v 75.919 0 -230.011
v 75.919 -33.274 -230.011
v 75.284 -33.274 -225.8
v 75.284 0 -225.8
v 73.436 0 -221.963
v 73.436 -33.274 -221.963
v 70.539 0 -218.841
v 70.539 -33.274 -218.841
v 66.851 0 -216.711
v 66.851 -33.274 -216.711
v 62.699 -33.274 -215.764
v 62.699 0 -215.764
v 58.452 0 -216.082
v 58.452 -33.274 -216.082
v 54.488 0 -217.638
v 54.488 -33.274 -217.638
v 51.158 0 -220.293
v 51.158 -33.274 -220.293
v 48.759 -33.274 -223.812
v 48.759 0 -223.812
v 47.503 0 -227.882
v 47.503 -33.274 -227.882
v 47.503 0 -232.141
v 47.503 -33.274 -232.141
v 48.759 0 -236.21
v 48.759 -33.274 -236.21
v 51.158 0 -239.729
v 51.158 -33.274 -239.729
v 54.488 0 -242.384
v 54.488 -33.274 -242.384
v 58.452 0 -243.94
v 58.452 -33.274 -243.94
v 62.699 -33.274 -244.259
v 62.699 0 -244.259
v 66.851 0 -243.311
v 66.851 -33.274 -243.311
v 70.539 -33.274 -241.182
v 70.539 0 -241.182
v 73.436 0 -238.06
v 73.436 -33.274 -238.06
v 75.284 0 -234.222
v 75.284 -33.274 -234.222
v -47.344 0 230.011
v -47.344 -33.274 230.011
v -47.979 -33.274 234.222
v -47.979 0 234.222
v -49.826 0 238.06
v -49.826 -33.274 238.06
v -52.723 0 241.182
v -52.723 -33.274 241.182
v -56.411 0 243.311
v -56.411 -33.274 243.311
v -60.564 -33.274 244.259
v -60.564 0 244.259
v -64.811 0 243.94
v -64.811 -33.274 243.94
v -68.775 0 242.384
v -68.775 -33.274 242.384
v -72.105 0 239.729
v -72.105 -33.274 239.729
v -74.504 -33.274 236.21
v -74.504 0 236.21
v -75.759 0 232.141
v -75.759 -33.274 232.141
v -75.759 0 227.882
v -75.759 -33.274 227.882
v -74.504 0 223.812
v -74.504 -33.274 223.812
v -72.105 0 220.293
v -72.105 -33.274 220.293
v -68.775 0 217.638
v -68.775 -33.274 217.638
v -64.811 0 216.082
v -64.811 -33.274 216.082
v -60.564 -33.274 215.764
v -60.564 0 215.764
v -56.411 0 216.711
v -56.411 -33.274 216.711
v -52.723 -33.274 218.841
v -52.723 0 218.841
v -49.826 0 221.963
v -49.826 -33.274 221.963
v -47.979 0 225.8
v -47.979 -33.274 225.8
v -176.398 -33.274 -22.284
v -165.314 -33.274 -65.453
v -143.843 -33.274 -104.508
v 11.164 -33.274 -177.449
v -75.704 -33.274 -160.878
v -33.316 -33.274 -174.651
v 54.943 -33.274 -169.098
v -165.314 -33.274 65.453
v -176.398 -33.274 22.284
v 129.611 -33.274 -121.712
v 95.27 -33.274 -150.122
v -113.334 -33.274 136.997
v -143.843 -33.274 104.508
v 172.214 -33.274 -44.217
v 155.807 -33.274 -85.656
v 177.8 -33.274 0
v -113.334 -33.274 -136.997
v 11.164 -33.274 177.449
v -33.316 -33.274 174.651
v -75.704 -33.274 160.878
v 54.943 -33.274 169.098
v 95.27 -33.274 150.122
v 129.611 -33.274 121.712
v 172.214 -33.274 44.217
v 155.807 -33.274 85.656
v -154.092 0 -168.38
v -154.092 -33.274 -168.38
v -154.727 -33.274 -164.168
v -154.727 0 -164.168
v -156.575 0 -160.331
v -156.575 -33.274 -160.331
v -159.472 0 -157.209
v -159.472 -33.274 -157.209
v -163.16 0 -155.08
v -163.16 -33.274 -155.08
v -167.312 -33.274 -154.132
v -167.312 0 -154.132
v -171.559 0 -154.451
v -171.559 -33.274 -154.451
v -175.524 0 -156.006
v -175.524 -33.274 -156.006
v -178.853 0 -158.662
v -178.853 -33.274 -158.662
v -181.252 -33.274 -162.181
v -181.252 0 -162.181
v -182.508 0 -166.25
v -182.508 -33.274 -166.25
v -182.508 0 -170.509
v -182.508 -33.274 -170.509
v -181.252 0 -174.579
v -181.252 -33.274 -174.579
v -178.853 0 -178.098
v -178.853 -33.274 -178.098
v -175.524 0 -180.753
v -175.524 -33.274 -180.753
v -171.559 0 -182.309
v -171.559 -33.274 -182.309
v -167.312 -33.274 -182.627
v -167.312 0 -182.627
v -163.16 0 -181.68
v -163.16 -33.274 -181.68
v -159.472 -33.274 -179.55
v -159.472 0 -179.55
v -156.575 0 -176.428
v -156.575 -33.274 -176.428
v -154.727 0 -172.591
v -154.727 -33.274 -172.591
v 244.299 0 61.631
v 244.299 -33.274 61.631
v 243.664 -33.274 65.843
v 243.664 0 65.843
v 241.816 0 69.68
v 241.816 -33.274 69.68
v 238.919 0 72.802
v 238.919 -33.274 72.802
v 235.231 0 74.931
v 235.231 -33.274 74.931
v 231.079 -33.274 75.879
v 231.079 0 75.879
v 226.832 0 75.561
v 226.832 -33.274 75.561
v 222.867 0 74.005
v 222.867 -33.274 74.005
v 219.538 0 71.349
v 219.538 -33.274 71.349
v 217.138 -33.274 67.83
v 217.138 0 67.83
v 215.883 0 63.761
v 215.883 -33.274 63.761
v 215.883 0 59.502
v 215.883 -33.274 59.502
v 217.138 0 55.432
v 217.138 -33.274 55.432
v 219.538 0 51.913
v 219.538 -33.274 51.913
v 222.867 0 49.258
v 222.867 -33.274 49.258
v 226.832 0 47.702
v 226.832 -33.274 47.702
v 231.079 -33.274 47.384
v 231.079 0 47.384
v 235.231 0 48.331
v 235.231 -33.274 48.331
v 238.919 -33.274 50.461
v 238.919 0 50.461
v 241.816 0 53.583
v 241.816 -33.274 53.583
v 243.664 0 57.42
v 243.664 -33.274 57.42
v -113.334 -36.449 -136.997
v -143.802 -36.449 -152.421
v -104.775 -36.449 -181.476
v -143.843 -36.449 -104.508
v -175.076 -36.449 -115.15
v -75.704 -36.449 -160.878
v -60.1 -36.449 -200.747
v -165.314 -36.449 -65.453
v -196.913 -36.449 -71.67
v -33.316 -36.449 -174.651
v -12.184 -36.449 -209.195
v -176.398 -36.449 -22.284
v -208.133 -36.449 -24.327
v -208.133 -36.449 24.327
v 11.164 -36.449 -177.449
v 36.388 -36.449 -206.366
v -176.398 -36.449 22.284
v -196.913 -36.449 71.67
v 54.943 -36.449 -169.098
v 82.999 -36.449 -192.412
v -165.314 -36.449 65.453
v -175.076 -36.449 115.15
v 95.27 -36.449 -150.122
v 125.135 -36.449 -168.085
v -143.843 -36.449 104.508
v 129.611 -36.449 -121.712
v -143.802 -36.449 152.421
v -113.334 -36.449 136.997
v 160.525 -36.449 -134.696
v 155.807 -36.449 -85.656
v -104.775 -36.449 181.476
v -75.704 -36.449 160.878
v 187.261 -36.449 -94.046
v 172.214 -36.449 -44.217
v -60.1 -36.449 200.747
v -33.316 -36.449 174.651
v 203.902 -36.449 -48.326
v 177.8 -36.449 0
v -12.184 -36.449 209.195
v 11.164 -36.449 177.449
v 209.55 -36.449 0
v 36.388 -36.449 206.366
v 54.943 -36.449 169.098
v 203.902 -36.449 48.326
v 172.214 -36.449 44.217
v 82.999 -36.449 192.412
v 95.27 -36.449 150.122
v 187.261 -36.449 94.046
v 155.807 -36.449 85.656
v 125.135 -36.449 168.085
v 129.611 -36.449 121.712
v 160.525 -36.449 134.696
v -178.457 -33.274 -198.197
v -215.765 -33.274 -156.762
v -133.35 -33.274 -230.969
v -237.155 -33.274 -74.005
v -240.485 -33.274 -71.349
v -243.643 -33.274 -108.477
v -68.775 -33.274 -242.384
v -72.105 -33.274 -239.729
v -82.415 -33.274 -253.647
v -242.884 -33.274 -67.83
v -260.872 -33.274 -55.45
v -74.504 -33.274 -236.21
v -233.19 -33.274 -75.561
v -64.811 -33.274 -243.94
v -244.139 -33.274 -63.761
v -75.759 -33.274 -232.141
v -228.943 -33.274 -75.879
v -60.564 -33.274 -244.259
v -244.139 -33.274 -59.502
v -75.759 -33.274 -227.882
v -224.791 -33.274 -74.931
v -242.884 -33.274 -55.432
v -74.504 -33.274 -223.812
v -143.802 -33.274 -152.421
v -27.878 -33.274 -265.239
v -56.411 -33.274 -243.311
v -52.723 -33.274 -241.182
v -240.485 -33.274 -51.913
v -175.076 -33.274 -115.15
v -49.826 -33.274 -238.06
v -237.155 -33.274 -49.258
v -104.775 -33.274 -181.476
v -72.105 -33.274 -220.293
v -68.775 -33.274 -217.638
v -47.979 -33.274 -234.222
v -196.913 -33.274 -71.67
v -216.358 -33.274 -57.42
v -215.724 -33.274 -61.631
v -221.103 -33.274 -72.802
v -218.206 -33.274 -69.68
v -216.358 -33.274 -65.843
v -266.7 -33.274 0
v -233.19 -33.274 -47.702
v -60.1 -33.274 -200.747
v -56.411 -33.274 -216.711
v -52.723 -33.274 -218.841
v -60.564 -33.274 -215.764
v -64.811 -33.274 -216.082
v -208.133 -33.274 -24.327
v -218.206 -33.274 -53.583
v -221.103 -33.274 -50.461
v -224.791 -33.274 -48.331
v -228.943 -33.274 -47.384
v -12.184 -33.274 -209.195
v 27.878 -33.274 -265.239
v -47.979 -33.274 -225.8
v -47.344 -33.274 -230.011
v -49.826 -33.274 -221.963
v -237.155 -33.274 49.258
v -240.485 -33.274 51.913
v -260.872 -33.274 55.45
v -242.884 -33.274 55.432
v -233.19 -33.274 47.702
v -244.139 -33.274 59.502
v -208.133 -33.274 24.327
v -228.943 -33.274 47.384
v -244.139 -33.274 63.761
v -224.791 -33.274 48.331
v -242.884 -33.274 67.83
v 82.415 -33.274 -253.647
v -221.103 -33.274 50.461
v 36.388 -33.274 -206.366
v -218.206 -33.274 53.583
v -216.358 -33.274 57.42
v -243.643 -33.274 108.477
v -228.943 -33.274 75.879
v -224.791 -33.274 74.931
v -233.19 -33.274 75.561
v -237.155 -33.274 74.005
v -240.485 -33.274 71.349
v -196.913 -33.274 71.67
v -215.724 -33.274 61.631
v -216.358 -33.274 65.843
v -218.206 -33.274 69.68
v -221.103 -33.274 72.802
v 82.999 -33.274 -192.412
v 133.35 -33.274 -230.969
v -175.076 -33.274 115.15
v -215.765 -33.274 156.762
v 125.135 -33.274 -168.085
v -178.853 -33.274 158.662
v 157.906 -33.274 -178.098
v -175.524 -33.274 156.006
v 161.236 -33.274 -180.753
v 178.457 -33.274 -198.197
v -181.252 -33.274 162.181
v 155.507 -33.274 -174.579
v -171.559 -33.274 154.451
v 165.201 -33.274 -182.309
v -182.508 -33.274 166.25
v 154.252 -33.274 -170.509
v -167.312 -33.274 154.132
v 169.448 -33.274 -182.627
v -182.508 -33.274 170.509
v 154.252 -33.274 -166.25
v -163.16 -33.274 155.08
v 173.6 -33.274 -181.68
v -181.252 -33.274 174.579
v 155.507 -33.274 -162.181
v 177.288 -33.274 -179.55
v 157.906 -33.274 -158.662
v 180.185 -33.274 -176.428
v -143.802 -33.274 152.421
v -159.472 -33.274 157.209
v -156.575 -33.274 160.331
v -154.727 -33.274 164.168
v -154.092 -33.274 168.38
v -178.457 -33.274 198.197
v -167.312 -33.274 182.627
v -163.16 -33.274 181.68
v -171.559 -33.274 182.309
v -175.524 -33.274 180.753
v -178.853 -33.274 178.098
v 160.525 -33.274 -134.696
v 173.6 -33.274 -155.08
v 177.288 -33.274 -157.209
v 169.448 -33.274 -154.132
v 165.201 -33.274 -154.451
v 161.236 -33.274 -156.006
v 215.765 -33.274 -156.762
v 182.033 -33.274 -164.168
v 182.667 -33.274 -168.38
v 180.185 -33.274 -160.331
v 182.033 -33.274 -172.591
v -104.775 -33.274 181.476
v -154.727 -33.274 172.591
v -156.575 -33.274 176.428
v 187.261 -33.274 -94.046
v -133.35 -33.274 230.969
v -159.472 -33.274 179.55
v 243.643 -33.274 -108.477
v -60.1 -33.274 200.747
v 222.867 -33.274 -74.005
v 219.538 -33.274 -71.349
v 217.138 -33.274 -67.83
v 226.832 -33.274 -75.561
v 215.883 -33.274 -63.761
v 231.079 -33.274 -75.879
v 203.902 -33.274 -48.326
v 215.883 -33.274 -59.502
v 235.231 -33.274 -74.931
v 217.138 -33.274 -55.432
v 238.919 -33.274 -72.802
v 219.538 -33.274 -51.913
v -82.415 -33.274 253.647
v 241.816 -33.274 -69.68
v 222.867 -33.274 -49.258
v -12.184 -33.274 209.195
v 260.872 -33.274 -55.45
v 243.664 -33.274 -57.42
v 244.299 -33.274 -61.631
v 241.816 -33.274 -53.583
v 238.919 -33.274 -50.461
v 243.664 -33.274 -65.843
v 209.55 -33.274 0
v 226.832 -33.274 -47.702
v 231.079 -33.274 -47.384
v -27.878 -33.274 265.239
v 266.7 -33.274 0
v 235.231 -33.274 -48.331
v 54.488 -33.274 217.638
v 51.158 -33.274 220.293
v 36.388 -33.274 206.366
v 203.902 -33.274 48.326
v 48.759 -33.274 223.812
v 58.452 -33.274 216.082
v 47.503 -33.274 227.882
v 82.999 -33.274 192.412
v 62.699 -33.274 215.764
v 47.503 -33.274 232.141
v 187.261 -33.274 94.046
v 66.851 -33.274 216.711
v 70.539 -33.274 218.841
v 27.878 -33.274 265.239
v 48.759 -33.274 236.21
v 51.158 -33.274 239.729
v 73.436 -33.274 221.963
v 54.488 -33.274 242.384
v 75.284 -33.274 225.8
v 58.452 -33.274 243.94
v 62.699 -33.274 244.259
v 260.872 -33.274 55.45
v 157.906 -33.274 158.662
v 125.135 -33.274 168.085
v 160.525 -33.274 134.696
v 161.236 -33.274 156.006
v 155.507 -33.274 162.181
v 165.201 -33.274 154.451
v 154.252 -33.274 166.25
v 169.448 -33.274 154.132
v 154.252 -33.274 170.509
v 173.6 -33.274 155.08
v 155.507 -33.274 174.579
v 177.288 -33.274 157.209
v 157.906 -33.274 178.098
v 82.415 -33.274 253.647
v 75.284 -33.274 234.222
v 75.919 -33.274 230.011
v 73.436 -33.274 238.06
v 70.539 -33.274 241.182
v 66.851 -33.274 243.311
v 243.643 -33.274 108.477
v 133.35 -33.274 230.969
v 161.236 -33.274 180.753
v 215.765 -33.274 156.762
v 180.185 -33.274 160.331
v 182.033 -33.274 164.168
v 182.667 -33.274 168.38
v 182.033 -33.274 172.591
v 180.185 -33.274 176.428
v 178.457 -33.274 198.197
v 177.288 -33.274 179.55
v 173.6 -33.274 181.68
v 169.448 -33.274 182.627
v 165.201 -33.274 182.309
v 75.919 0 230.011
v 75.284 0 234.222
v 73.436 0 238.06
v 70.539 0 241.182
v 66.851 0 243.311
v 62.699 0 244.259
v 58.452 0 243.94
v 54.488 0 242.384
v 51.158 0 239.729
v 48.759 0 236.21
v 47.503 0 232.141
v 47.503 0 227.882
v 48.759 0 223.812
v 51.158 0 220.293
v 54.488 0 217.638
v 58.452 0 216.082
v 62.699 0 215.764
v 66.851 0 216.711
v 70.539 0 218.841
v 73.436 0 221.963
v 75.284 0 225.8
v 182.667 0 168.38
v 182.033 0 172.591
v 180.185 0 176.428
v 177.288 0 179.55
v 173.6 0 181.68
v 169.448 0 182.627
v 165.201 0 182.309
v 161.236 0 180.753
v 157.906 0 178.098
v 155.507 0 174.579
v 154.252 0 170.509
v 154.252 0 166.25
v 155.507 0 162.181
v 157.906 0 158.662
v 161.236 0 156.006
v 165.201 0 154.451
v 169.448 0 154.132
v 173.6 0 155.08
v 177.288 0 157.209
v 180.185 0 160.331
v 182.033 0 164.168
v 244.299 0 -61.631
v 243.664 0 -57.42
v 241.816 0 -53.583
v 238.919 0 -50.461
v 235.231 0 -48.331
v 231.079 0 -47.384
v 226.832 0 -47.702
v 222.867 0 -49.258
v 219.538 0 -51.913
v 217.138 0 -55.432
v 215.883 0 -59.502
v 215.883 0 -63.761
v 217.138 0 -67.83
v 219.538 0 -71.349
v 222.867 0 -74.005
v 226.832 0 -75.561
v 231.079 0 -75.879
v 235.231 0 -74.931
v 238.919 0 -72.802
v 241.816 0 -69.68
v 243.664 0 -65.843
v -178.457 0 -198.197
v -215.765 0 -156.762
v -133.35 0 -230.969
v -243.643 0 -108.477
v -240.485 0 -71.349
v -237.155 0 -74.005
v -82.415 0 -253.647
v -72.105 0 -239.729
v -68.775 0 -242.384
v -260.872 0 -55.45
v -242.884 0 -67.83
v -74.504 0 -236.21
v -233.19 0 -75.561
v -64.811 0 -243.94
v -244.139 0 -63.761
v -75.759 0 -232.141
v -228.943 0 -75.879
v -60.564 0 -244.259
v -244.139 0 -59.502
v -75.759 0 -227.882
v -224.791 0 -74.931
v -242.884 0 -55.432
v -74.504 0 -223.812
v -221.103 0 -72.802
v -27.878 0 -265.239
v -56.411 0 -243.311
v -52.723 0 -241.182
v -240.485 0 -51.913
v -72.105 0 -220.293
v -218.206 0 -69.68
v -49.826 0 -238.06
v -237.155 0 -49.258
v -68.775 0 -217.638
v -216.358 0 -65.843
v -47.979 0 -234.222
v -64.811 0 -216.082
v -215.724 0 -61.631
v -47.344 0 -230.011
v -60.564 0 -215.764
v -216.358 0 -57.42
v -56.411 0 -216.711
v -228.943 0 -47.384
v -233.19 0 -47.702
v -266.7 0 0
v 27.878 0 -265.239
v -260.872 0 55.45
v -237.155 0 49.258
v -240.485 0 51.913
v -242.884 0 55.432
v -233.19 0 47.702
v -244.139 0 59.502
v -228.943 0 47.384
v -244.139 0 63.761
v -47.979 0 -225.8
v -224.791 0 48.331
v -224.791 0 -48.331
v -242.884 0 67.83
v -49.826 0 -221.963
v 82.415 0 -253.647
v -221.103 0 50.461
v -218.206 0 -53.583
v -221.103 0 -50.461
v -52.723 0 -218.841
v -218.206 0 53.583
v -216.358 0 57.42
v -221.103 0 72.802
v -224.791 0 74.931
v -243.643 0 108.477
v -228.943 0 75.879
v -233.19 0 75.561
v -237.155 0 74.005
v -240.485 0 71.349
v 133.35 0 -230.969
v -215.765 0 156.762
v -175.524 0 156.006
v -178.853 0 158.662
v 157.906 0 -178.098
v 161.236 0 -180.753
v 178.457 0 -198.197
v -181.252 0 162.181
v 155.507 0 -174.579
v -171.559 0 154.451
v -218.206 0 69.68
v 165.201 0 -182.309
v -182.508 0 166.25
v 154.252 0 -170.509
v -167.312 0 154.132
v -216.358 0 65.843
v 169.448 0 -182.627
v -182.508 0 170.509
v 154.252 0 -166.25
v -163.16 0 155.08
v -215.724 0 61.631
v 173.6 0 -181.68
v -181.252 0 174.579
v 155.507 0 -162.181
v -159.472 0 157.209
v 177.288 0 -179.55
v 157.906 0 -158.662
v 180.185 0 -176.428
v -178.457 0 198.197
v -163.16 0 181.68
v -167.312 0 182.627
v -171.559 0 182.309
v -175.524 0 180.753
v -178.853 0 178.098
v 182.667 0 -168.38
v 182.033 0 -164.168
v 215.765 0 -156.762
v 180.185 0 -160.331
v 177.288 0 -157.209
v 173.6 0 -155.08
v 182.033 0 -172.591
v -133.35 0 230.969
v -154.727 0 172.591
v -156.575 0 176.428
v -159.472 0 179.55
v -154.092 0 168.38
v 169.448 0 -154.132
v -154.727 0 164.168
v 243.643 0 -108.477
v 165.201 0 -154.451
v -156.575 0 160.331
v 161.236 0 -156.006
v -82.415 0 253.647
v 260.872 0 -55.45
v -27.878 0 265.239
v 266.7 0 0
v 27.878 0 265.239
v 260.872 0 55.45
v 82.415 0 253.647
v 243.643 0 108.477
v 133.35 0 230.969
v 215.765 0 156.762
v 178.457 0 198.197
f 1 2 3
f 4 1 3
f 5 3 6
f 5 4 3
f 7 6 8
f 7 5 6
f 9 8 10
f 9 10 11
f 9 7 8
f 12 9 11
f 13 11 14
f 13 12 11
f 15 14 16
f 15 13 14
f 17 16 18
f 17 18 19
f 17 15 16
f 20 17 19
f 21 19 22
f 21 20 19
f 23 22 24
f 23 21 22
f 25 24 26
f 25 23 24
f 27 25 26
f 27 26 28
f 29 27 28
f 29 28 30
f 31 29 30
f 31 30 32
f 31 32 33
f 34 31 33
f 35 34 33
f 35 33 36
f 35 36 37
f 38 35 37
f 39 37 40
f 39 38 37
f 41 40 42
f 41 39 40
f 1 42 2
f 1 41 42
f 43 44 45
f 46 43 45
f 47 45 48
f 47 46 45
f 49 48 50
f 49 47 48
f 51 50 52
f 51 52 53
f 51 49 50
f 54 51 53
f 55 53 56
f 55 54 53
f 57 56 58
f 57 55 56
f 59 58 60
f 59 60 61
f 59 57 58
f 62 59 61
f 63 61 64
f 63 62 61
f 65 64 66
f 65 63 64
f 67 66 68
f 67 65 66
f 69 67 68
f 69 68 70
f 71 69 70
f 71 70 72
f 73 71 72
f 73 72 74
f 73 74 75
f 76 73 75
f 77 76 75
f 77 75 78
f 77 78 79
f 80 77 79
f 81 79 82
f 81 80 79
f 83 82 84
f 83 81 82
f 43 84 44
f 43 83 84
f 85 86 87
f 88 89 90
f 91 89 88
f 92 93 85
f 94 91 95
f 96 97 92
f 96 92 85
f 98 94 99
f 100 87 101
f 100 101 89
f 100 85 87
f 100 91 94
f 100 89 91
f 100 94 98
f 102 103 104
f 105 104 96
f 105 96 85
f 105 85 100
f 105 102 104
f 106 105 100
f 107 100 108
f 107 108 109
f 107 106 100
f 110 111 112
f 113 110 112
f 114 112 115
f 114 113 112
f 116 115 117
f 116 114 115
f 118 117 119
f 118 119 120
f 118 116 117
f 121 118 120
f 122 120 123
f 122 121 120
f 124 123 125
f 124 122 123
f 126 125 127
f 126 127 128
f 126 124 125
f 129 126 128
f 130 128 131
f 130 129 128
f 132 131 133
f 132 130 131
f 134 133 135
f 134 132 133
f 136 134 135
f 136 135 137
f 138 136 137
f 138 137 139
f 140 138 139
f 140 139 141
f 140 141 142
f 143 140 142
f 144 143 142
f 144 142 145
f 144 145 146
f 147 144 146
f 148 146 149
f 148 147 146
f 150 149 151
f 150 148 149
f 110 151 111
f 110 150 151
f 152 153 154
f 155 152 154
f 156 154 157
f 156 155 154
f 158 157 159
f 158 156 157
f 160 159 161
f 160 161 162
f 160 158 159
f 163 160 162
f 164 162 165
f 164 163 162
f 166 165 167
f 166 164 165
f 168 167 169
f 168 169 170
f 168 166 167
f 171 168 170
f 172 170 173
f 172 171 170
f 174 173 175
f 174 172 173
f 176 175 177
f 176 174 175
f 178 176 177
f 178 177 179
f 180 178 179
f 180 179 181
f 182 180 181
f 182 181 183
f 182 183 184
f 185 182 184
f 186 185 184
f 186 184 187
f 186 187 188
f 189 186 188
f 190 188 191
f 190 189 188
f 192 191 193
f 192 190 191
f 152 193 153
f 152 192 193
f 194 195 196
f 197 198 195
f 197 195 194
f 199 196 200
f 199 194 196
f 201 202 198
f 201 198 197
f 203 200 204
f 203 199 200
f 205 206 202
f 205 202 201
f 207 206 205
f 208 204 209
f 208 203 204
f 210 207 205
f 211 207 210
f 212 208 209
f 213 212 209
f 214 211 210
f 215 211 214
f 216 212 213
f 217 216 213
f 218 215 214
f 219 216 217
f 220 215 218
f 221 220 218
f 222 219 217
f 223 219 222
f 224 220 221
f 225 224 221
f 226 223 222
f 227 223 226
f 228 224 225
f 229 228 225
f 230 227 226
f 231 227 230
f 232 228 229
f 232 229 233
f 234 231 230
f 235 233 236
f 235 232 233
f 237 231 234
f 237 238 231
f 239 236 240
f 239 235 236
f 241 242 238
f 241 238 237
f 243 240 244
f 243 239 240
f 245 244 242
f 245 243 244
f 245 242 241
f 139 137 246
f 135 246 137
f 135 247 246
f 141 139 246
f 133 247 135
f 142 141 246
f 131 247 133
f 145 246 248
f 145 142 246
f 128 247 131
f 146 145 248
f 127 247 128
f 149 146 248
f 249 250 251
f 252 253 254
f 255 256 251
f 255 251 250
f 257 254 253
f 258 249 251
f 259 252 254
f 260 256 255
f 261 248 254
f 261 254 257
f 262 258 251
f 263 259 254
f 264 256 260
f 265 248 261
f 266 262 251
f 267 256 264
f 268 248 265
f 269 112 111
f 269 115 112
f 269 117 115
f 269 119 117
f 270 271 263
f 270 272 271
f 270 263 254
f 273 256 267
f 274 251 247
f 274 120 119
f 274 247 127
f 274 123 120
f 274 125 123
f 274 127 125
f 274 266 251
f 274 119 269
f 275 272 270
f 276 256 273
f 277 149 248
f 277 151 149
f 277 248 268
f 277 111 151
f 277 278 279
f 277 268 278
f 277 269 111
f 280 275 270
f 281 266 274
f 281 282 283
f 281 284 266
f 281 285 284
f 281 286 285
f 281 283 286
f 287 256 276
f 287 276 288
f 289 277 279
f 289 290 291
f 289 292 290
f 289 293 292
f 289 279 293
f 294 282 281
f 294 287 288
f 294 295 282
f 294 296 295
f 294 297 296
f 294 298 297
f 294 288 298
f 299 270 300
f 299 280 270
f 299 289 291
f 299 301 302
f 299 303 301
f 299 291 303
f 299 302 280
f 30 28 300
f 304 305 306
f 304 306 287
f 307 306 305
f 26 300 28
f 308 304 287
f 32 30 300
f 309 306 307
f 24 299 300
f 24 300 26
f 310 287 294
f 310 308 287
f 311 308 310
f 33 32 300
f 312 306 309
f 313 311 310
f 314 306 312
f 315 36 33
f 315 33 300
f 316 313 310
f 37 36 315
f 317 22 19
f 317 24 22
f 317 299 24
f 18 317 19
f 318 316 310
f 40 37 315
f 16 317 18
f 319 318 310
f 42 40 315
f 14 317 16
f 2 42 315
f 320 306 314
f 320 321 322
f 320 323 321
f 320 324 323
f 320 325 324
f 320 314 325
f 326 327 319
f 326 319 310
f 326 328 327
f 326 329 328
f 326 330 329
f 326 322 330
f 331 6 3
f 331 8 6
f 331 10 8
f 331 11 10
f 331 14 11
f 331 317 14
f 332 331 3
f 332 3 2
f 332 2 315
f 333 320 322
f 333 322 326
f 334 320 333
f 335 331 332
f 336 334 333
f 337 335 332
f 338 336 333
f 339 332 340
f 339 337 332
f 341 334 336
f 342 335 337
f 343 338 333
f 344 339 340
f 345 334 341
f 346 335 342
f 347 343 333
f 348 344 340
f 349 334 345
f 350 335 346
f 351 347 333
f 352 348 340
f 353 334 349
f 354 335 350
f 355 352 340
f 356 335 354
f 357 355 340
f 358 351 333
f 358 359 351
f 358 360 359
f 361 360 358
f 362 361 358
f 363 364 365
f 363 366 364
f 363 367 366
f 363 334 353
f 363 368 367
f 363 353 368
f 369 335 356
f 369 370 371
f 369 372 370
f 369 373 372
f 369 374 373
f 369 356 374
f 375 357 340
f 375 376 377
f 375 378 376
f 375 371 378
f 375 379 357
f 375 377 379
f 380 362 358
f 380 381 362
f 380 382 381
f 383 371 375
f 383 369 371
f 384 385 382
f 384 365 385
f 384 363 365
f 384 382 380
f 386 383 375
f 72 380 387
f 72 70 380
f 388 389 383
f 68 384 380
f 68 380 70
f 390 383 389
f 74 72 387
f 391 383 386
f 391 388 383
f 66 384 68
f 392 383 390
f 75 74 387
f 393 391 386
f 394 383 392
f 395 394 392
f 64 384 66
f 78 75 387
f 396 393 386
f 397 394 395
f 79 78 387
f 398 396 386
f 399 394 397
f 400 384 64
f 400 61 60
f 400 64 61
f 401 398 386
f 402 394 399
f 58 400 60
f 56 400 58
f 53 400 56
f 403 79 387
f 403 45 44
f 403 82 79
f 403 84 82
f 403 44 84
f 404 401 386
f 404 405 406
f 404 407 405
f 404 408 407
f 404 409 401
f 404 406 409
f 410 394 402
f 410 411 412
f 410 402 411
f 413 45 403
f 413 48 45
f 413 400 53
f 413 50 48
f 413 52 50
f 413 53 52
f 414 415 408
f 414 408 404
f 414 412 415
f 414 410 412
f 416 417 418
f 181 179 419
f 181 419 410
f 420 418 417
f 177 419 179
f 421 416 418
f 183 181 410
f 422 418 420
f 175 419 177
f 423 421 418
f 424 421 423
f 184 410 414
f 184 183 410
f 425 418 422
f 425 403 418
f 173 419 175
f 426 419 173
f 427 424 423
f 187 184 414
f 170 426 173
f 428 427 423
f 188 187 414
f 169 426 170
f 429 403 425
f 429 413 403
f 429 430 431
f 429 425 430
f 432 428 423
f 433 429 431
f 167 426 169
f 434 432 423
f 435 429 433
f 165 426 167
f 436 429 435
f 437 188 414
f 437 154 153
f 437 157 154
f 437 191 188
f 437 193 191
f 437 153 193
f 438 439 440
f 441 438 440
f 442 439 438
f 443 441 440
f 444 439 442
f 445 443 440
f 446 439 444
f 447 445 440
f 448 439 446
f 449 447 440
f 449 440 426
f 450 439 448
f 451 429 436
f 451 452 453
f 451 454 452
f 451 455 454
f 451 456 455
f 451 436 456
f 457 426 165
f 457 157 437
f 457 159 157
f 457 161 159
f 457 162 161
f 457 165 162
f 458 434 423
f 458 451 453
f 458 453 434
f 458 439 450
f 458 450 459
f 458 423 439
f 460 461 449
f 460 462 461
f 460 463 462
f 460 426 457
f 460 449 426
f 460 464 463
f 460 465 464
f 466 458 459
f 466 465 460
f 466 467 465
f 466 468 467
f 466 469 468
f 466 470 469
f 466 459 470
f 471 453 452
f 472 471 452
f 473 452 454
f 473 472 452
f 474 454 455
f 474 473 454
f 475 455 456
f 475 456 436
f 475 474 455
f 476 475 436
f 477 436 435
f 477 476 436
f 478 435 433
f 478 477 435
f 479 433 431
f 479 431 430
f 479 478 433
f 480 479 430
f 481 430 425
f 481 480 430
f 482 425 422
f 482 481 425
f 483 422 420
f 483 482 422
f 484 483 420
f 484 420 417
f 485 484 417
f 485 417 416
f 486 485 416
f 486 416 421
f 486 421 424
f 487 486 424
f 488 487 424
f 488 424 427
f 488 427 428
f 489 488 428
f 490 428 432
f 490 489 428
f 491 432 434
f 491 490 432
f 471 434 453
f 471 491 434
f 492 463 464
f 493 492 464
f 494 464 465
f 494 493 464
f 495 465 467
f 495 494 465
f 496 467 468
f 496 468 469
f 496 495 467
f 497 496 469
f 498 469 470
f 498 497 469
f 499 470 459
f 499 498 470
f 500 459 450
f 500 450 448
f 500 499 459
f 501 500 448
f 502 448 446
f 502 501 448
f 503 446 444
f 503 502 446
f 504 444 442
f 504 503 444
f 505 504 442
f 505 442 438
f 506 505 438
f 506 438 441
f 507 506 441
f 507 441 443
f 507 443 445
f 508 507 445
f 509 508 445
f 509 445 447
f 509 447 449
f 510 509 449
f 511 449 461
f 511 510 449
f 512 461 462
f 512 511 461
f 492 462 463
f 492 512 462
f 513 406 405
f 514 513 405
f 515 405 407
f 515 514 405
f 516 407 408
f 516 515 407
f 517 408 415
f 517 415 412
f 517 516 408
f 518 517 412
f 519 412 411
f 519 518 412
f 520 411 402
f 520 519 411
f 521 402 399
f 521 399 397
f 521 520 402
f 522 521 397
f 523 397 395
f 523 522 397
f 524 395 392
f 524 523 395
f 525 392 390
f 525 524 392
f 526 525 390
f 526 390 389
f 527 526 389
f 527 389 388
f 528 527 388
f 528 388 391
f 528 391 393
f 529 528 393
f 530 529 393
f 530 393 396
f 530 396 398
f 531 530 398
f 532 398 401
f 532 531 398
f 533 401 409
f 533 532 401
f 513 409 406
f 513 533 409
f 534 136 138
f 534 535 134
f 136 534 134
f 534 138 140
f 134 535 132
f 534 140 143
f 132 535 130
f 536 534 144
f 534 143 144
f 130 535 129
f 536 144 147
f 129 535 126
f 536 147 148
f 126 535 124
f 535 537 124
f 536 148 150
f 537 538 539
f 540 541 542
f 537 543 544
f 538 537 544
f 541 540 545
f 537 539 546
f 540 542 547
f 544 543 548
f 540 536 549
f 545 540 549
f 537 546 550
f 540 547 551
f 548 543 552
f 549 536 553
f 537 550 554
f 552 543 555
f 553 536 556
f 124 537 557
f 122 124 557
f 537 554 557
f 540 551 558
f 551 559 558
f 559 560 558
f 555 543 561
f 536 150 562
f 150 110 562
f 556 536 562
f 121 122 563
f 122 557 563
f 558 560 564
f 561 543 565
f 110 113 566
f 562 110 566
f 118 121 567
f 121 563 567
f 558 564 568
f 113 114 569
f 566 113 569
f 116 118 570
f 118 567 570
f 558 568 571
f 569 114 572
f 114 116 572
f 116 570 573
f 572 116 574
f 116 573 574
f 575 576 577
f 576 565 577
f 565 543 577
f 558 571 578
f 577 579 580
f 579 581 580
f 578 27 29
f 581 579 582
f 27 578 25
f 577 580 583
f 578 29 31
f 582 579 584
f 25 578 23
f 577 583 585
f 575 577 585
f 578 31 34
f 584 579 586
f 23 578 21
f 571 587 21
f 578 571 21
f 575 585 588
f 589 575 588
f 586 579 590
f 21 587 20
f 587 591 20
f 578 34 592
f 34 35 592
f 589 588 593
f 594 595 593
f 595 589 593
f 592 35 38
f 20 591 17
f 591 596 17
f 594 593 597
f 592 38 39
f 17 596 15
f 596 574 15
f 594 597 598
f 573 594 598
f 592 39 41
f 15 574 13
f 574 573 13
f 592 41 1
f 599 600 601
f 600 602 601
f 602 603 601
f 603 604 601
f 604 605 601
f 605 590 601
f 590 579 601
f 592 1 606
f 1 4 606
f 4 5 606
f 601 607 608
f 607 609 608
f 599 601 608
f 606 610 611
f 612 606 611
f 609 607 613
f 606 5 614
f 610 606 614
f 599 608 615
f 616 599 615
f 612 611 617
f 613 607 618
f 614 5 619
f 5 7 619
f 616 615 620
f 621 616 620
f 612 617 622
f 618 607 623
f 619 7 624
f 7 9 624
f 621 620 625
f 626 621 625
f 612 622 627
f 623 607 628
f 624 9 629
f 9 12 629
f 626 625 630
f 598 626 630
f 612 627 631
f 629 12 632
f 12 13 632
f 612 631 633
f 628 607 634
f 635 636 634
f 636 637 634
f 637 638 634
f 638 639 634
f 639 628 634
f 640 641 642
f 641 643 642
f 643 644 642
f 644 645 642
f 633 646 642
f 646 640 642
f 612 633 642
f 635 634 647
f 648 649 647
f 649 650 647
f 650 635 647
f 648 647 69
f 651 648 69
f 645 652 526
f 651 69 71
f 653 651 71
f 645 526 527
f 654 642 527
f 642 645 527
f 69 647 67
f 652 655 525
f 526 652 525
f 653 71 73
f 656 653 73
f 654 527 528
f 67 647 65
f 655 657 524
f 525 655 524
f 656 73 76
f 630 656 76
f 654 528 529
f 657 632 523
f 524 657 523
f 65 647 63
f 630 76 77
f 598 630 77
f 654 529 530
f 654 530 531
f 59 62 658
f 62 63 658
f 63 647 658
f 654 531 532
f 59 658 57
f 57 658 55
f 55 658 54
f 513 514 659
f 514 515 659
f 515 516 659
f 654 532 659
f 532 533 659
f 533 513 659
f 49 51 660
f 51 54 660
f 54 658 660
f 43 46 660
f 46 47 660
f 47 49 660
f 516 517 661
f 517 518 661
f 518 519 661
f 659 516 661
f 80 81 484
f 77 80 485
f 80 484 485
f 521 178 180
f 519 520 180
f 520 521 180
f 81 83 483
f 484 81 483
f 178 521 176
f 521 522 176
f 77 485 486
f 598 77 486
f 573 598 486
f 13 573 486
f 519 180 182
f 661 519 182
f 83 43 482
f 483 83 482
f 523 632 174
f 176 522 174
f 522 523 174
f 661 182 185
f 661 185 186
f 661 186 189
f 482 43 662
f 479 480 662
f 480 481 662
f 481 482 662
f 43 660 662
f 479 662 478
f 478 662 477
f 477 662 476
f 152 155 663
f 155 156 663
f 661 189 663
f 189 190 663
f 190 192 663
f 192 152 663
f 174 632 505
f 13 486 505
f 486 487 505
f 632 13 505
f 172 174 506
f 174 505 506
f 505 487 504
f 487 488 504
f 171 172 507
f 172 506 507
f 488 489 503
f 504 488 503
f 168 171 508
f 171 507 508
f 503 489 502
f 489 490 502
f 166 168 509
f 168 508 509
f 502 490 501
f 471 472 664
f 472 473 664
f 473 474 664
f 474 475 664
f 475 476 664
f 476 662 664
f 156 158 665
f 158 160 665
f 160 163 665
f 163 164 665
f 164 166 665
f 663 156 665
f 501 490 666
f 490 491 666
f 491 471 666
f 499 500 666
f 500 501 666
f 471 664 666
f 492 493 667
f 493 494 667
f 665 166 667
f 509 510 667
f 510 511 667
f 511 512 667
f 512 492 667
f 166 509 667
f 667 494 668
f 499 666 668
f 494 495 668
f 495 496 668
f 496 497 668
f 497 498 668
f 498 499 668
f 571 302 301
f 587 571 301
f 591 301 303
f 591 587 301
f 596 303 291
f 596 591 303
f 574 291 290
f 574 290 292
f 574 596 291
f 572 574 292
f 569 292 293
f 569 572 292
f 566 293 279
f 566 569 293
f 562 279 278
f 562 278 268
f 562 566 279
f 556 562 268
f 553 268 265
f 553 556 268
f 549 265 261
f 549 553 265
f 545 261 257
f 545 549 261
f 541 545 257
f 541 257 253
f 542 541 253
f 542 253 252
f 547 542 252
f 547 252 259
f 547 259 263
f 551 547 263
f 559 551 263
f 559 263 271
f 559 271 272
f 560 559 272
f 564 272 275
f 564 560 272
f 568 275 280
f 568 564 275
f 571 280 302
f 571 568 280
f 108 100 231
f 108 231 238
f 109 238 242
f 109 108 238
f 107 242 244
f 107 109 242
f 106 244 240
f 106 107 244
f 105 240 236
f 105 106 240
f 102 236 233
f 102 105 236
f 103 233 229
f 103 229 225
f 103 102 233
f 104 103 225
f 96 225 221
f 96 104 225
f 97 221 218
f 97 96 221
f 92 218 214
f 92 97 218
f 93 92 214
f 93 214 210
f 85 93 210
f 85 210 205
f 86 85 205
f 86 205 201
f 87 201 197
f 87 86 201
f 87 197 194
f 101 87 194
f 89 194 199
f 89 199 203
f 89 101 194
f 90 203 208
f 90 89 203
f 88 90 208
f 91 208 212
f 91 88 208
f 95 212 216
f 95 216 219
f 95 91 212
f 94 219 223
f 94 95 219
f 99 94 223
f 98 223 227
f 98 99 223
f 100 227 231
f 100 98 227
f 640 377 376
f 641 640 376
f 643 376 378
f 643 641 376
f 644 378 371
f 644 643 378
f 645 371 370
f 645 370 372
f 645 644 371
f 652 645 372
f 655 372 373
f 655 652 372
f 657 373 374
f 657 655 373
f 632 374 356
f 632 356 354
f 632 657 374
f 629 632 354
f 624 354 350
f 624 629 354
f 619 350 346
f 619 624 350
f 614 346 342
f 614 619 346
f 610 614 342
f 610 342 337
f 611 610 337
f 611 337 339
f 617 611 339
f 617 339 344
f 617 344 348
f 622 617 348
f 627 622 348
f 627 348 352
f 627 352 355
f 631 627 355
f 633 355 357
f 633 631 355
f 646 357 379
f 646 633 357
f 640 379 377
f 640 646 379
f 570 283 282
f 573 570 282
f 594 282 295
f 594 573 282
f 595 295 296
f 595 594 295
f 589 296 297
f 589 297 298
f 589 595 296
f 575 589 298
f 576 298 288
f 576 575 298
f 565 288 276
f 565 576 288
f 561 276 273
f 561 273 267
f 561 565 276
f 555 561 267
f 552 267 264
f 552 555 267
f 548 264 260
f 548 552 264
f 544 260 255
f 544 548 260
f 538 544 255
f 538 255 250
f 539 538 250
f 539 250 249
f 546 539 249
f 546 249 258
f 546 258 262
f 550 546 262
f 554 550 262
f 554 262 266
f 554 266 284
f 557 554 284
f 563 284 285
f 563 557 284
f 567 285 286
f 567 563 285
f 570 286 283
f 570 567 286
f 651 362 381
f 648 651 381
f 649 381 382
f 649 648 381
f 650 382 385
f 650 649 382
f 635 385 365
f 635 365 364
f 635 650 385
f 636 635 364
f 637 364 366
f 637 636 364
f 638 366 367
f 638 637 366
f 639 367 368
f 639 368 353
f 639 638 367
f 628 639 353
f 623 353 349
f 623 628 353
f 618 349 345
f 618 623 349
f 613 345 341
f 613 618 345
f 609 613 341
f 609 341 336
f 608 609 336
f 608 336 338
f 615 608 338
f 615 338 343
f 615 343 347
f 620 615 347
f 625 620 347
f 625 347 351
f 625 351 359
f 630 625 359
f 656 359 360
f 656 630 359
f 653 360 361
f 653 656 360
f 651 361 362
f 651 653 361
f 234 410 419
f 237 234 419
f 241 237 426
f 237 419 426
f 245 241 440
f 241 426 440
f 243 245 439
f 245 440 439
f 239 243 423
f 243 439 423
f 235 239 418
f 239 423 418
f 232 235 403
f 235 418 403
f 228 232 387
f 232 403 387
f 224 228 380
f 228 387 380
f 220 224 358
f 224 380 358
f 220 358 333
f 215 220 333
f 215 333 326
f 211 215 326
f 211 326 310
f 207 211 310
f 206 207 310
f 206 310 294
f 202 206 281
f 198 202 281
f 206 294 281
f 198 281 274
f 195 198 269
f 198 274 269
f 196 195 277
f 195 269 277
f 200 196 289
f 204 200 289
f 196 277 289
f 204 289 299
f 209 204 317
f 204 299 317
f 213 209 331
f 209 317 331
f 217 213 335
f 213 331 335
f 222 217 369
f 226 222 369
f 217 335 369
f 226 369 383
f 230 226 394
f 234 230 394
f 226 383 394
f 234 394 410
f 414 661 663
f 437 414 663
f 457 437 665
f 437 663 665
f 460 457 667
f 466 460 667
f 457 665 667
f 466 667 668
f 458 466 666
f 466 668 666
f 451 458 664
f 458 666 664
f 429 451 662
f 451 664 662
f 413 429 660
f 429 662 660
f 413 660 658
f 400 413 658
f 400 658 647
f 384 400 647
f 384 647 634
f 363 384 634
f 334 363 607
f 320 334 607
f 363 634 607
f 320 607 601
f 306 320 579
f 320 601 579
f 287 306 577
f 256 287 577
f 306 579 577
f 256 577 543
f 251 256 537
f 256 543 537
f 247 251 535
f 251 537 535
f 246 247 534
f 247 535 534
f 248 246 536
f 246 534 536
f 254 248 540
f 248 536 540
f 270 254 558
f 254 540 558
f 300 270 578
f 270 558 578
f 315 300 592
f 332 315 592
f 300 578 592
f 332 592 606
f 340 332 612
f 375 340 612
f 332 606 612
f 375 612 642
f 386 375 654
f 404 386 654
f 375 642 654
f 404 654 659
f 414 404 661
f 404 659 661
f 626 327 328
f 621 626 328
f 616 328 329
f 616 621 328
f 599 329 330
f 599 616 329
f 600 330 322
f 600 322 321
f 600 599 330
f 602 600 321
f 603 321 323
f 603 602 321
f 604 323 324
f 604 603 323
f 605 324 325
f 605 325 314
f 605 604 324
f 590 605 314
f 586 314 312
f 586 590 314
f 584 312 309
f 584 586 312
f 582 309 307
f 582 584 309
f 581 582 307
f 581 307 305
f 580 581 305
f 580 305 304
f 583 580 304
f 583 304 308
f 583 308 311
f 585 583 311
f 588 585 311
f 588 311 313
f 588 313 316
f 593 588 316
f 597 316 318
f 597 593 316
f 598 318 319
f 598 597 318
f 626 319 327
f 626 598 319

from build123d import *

# Parameters (mm, degrees)
F0_R     = 266.7
F0_R_2   = 14.2875
F0_R_3   = 177.8
F1_DEPTH = 33.274
F2_R     = 209.55
F2_R_2   = 177.8
F3_DEPTH = 3.175
F4_R     = 177.8
F5_DEPTH = 33.274


with BuildPart() as f1:
    # F0 (on Front) → F1 (new body)
    with BuildSketch(Plane.XZ):
        Circle(F0_R)
        with Locations((-168.379802, -168.379802)):
            Circle(F0_R_2, mode=Mode.SUBTRACT)
        with Locations((-61.631285, -230.011087)):
            Circle(F0_R_2, mode=Mode.SUBTRACT)
        with Locations((-230.011087, -61.631285)):
            Circle(F0_R_2, mode=Mode.SUBTRACT)
        with Locations((61.631285, -230.011087)):
            Circle(F0_R_2, mode=Mode.SUBTRACT)
        with Locations((168.379802, -168.379802)):
            Circle(F0_R_2, mode=Mode.SUBTRACT)
        with Locations((230.011087, -61.631285)):
            Circle(F0_R_2, mode=Mode.SUBTRACT)
        with Locations((-230.011087, 61.631285)):
            Circle(F0_R_2, mode=Mode.SUBTRACT)
        with Locations((-168.379802, 168.379802)):
            Circle(F0_R_2, mode=Mode.SUBTRACT)
        with Locations((-61.631285, 230.011087)):
            Circle(F0_R_2, mode=Mode.SUBTRACT)
        Circle(F0_R_3, mode=Mode.SUBTRACT)
        with Locations((230.011087, 61.631285)):
            Circle(F0_R_2, mode=Mode.SUBTRACT)
        with Locations((61.631285, 230.011087)):
            Circle(F0_R_2, mode=Mode.SUBTRACT)
        with Locations((168.379802, 168.379802)):
            Circle(F0_R_2, mode=Mode.SUBTRACT)
    extrude(amount=F1_DEPTH)

    # F2 (on face) → F3 (join)
    with BuildSketch(Plane.XZ.offset(33.274)):
        Circle(F2_R)
        Circle(F2_R_2, mode=Mode.SUBTRACT)
    extrude(amount=F3_DEPTH)

    # F4 (on face) → F5 (join)
    with BuildSketch(Plane.XZ.offset(33.274)):
        Circle(F4_R)
    extrude(amount=-F5_DEPTH)


solid = f1.part
